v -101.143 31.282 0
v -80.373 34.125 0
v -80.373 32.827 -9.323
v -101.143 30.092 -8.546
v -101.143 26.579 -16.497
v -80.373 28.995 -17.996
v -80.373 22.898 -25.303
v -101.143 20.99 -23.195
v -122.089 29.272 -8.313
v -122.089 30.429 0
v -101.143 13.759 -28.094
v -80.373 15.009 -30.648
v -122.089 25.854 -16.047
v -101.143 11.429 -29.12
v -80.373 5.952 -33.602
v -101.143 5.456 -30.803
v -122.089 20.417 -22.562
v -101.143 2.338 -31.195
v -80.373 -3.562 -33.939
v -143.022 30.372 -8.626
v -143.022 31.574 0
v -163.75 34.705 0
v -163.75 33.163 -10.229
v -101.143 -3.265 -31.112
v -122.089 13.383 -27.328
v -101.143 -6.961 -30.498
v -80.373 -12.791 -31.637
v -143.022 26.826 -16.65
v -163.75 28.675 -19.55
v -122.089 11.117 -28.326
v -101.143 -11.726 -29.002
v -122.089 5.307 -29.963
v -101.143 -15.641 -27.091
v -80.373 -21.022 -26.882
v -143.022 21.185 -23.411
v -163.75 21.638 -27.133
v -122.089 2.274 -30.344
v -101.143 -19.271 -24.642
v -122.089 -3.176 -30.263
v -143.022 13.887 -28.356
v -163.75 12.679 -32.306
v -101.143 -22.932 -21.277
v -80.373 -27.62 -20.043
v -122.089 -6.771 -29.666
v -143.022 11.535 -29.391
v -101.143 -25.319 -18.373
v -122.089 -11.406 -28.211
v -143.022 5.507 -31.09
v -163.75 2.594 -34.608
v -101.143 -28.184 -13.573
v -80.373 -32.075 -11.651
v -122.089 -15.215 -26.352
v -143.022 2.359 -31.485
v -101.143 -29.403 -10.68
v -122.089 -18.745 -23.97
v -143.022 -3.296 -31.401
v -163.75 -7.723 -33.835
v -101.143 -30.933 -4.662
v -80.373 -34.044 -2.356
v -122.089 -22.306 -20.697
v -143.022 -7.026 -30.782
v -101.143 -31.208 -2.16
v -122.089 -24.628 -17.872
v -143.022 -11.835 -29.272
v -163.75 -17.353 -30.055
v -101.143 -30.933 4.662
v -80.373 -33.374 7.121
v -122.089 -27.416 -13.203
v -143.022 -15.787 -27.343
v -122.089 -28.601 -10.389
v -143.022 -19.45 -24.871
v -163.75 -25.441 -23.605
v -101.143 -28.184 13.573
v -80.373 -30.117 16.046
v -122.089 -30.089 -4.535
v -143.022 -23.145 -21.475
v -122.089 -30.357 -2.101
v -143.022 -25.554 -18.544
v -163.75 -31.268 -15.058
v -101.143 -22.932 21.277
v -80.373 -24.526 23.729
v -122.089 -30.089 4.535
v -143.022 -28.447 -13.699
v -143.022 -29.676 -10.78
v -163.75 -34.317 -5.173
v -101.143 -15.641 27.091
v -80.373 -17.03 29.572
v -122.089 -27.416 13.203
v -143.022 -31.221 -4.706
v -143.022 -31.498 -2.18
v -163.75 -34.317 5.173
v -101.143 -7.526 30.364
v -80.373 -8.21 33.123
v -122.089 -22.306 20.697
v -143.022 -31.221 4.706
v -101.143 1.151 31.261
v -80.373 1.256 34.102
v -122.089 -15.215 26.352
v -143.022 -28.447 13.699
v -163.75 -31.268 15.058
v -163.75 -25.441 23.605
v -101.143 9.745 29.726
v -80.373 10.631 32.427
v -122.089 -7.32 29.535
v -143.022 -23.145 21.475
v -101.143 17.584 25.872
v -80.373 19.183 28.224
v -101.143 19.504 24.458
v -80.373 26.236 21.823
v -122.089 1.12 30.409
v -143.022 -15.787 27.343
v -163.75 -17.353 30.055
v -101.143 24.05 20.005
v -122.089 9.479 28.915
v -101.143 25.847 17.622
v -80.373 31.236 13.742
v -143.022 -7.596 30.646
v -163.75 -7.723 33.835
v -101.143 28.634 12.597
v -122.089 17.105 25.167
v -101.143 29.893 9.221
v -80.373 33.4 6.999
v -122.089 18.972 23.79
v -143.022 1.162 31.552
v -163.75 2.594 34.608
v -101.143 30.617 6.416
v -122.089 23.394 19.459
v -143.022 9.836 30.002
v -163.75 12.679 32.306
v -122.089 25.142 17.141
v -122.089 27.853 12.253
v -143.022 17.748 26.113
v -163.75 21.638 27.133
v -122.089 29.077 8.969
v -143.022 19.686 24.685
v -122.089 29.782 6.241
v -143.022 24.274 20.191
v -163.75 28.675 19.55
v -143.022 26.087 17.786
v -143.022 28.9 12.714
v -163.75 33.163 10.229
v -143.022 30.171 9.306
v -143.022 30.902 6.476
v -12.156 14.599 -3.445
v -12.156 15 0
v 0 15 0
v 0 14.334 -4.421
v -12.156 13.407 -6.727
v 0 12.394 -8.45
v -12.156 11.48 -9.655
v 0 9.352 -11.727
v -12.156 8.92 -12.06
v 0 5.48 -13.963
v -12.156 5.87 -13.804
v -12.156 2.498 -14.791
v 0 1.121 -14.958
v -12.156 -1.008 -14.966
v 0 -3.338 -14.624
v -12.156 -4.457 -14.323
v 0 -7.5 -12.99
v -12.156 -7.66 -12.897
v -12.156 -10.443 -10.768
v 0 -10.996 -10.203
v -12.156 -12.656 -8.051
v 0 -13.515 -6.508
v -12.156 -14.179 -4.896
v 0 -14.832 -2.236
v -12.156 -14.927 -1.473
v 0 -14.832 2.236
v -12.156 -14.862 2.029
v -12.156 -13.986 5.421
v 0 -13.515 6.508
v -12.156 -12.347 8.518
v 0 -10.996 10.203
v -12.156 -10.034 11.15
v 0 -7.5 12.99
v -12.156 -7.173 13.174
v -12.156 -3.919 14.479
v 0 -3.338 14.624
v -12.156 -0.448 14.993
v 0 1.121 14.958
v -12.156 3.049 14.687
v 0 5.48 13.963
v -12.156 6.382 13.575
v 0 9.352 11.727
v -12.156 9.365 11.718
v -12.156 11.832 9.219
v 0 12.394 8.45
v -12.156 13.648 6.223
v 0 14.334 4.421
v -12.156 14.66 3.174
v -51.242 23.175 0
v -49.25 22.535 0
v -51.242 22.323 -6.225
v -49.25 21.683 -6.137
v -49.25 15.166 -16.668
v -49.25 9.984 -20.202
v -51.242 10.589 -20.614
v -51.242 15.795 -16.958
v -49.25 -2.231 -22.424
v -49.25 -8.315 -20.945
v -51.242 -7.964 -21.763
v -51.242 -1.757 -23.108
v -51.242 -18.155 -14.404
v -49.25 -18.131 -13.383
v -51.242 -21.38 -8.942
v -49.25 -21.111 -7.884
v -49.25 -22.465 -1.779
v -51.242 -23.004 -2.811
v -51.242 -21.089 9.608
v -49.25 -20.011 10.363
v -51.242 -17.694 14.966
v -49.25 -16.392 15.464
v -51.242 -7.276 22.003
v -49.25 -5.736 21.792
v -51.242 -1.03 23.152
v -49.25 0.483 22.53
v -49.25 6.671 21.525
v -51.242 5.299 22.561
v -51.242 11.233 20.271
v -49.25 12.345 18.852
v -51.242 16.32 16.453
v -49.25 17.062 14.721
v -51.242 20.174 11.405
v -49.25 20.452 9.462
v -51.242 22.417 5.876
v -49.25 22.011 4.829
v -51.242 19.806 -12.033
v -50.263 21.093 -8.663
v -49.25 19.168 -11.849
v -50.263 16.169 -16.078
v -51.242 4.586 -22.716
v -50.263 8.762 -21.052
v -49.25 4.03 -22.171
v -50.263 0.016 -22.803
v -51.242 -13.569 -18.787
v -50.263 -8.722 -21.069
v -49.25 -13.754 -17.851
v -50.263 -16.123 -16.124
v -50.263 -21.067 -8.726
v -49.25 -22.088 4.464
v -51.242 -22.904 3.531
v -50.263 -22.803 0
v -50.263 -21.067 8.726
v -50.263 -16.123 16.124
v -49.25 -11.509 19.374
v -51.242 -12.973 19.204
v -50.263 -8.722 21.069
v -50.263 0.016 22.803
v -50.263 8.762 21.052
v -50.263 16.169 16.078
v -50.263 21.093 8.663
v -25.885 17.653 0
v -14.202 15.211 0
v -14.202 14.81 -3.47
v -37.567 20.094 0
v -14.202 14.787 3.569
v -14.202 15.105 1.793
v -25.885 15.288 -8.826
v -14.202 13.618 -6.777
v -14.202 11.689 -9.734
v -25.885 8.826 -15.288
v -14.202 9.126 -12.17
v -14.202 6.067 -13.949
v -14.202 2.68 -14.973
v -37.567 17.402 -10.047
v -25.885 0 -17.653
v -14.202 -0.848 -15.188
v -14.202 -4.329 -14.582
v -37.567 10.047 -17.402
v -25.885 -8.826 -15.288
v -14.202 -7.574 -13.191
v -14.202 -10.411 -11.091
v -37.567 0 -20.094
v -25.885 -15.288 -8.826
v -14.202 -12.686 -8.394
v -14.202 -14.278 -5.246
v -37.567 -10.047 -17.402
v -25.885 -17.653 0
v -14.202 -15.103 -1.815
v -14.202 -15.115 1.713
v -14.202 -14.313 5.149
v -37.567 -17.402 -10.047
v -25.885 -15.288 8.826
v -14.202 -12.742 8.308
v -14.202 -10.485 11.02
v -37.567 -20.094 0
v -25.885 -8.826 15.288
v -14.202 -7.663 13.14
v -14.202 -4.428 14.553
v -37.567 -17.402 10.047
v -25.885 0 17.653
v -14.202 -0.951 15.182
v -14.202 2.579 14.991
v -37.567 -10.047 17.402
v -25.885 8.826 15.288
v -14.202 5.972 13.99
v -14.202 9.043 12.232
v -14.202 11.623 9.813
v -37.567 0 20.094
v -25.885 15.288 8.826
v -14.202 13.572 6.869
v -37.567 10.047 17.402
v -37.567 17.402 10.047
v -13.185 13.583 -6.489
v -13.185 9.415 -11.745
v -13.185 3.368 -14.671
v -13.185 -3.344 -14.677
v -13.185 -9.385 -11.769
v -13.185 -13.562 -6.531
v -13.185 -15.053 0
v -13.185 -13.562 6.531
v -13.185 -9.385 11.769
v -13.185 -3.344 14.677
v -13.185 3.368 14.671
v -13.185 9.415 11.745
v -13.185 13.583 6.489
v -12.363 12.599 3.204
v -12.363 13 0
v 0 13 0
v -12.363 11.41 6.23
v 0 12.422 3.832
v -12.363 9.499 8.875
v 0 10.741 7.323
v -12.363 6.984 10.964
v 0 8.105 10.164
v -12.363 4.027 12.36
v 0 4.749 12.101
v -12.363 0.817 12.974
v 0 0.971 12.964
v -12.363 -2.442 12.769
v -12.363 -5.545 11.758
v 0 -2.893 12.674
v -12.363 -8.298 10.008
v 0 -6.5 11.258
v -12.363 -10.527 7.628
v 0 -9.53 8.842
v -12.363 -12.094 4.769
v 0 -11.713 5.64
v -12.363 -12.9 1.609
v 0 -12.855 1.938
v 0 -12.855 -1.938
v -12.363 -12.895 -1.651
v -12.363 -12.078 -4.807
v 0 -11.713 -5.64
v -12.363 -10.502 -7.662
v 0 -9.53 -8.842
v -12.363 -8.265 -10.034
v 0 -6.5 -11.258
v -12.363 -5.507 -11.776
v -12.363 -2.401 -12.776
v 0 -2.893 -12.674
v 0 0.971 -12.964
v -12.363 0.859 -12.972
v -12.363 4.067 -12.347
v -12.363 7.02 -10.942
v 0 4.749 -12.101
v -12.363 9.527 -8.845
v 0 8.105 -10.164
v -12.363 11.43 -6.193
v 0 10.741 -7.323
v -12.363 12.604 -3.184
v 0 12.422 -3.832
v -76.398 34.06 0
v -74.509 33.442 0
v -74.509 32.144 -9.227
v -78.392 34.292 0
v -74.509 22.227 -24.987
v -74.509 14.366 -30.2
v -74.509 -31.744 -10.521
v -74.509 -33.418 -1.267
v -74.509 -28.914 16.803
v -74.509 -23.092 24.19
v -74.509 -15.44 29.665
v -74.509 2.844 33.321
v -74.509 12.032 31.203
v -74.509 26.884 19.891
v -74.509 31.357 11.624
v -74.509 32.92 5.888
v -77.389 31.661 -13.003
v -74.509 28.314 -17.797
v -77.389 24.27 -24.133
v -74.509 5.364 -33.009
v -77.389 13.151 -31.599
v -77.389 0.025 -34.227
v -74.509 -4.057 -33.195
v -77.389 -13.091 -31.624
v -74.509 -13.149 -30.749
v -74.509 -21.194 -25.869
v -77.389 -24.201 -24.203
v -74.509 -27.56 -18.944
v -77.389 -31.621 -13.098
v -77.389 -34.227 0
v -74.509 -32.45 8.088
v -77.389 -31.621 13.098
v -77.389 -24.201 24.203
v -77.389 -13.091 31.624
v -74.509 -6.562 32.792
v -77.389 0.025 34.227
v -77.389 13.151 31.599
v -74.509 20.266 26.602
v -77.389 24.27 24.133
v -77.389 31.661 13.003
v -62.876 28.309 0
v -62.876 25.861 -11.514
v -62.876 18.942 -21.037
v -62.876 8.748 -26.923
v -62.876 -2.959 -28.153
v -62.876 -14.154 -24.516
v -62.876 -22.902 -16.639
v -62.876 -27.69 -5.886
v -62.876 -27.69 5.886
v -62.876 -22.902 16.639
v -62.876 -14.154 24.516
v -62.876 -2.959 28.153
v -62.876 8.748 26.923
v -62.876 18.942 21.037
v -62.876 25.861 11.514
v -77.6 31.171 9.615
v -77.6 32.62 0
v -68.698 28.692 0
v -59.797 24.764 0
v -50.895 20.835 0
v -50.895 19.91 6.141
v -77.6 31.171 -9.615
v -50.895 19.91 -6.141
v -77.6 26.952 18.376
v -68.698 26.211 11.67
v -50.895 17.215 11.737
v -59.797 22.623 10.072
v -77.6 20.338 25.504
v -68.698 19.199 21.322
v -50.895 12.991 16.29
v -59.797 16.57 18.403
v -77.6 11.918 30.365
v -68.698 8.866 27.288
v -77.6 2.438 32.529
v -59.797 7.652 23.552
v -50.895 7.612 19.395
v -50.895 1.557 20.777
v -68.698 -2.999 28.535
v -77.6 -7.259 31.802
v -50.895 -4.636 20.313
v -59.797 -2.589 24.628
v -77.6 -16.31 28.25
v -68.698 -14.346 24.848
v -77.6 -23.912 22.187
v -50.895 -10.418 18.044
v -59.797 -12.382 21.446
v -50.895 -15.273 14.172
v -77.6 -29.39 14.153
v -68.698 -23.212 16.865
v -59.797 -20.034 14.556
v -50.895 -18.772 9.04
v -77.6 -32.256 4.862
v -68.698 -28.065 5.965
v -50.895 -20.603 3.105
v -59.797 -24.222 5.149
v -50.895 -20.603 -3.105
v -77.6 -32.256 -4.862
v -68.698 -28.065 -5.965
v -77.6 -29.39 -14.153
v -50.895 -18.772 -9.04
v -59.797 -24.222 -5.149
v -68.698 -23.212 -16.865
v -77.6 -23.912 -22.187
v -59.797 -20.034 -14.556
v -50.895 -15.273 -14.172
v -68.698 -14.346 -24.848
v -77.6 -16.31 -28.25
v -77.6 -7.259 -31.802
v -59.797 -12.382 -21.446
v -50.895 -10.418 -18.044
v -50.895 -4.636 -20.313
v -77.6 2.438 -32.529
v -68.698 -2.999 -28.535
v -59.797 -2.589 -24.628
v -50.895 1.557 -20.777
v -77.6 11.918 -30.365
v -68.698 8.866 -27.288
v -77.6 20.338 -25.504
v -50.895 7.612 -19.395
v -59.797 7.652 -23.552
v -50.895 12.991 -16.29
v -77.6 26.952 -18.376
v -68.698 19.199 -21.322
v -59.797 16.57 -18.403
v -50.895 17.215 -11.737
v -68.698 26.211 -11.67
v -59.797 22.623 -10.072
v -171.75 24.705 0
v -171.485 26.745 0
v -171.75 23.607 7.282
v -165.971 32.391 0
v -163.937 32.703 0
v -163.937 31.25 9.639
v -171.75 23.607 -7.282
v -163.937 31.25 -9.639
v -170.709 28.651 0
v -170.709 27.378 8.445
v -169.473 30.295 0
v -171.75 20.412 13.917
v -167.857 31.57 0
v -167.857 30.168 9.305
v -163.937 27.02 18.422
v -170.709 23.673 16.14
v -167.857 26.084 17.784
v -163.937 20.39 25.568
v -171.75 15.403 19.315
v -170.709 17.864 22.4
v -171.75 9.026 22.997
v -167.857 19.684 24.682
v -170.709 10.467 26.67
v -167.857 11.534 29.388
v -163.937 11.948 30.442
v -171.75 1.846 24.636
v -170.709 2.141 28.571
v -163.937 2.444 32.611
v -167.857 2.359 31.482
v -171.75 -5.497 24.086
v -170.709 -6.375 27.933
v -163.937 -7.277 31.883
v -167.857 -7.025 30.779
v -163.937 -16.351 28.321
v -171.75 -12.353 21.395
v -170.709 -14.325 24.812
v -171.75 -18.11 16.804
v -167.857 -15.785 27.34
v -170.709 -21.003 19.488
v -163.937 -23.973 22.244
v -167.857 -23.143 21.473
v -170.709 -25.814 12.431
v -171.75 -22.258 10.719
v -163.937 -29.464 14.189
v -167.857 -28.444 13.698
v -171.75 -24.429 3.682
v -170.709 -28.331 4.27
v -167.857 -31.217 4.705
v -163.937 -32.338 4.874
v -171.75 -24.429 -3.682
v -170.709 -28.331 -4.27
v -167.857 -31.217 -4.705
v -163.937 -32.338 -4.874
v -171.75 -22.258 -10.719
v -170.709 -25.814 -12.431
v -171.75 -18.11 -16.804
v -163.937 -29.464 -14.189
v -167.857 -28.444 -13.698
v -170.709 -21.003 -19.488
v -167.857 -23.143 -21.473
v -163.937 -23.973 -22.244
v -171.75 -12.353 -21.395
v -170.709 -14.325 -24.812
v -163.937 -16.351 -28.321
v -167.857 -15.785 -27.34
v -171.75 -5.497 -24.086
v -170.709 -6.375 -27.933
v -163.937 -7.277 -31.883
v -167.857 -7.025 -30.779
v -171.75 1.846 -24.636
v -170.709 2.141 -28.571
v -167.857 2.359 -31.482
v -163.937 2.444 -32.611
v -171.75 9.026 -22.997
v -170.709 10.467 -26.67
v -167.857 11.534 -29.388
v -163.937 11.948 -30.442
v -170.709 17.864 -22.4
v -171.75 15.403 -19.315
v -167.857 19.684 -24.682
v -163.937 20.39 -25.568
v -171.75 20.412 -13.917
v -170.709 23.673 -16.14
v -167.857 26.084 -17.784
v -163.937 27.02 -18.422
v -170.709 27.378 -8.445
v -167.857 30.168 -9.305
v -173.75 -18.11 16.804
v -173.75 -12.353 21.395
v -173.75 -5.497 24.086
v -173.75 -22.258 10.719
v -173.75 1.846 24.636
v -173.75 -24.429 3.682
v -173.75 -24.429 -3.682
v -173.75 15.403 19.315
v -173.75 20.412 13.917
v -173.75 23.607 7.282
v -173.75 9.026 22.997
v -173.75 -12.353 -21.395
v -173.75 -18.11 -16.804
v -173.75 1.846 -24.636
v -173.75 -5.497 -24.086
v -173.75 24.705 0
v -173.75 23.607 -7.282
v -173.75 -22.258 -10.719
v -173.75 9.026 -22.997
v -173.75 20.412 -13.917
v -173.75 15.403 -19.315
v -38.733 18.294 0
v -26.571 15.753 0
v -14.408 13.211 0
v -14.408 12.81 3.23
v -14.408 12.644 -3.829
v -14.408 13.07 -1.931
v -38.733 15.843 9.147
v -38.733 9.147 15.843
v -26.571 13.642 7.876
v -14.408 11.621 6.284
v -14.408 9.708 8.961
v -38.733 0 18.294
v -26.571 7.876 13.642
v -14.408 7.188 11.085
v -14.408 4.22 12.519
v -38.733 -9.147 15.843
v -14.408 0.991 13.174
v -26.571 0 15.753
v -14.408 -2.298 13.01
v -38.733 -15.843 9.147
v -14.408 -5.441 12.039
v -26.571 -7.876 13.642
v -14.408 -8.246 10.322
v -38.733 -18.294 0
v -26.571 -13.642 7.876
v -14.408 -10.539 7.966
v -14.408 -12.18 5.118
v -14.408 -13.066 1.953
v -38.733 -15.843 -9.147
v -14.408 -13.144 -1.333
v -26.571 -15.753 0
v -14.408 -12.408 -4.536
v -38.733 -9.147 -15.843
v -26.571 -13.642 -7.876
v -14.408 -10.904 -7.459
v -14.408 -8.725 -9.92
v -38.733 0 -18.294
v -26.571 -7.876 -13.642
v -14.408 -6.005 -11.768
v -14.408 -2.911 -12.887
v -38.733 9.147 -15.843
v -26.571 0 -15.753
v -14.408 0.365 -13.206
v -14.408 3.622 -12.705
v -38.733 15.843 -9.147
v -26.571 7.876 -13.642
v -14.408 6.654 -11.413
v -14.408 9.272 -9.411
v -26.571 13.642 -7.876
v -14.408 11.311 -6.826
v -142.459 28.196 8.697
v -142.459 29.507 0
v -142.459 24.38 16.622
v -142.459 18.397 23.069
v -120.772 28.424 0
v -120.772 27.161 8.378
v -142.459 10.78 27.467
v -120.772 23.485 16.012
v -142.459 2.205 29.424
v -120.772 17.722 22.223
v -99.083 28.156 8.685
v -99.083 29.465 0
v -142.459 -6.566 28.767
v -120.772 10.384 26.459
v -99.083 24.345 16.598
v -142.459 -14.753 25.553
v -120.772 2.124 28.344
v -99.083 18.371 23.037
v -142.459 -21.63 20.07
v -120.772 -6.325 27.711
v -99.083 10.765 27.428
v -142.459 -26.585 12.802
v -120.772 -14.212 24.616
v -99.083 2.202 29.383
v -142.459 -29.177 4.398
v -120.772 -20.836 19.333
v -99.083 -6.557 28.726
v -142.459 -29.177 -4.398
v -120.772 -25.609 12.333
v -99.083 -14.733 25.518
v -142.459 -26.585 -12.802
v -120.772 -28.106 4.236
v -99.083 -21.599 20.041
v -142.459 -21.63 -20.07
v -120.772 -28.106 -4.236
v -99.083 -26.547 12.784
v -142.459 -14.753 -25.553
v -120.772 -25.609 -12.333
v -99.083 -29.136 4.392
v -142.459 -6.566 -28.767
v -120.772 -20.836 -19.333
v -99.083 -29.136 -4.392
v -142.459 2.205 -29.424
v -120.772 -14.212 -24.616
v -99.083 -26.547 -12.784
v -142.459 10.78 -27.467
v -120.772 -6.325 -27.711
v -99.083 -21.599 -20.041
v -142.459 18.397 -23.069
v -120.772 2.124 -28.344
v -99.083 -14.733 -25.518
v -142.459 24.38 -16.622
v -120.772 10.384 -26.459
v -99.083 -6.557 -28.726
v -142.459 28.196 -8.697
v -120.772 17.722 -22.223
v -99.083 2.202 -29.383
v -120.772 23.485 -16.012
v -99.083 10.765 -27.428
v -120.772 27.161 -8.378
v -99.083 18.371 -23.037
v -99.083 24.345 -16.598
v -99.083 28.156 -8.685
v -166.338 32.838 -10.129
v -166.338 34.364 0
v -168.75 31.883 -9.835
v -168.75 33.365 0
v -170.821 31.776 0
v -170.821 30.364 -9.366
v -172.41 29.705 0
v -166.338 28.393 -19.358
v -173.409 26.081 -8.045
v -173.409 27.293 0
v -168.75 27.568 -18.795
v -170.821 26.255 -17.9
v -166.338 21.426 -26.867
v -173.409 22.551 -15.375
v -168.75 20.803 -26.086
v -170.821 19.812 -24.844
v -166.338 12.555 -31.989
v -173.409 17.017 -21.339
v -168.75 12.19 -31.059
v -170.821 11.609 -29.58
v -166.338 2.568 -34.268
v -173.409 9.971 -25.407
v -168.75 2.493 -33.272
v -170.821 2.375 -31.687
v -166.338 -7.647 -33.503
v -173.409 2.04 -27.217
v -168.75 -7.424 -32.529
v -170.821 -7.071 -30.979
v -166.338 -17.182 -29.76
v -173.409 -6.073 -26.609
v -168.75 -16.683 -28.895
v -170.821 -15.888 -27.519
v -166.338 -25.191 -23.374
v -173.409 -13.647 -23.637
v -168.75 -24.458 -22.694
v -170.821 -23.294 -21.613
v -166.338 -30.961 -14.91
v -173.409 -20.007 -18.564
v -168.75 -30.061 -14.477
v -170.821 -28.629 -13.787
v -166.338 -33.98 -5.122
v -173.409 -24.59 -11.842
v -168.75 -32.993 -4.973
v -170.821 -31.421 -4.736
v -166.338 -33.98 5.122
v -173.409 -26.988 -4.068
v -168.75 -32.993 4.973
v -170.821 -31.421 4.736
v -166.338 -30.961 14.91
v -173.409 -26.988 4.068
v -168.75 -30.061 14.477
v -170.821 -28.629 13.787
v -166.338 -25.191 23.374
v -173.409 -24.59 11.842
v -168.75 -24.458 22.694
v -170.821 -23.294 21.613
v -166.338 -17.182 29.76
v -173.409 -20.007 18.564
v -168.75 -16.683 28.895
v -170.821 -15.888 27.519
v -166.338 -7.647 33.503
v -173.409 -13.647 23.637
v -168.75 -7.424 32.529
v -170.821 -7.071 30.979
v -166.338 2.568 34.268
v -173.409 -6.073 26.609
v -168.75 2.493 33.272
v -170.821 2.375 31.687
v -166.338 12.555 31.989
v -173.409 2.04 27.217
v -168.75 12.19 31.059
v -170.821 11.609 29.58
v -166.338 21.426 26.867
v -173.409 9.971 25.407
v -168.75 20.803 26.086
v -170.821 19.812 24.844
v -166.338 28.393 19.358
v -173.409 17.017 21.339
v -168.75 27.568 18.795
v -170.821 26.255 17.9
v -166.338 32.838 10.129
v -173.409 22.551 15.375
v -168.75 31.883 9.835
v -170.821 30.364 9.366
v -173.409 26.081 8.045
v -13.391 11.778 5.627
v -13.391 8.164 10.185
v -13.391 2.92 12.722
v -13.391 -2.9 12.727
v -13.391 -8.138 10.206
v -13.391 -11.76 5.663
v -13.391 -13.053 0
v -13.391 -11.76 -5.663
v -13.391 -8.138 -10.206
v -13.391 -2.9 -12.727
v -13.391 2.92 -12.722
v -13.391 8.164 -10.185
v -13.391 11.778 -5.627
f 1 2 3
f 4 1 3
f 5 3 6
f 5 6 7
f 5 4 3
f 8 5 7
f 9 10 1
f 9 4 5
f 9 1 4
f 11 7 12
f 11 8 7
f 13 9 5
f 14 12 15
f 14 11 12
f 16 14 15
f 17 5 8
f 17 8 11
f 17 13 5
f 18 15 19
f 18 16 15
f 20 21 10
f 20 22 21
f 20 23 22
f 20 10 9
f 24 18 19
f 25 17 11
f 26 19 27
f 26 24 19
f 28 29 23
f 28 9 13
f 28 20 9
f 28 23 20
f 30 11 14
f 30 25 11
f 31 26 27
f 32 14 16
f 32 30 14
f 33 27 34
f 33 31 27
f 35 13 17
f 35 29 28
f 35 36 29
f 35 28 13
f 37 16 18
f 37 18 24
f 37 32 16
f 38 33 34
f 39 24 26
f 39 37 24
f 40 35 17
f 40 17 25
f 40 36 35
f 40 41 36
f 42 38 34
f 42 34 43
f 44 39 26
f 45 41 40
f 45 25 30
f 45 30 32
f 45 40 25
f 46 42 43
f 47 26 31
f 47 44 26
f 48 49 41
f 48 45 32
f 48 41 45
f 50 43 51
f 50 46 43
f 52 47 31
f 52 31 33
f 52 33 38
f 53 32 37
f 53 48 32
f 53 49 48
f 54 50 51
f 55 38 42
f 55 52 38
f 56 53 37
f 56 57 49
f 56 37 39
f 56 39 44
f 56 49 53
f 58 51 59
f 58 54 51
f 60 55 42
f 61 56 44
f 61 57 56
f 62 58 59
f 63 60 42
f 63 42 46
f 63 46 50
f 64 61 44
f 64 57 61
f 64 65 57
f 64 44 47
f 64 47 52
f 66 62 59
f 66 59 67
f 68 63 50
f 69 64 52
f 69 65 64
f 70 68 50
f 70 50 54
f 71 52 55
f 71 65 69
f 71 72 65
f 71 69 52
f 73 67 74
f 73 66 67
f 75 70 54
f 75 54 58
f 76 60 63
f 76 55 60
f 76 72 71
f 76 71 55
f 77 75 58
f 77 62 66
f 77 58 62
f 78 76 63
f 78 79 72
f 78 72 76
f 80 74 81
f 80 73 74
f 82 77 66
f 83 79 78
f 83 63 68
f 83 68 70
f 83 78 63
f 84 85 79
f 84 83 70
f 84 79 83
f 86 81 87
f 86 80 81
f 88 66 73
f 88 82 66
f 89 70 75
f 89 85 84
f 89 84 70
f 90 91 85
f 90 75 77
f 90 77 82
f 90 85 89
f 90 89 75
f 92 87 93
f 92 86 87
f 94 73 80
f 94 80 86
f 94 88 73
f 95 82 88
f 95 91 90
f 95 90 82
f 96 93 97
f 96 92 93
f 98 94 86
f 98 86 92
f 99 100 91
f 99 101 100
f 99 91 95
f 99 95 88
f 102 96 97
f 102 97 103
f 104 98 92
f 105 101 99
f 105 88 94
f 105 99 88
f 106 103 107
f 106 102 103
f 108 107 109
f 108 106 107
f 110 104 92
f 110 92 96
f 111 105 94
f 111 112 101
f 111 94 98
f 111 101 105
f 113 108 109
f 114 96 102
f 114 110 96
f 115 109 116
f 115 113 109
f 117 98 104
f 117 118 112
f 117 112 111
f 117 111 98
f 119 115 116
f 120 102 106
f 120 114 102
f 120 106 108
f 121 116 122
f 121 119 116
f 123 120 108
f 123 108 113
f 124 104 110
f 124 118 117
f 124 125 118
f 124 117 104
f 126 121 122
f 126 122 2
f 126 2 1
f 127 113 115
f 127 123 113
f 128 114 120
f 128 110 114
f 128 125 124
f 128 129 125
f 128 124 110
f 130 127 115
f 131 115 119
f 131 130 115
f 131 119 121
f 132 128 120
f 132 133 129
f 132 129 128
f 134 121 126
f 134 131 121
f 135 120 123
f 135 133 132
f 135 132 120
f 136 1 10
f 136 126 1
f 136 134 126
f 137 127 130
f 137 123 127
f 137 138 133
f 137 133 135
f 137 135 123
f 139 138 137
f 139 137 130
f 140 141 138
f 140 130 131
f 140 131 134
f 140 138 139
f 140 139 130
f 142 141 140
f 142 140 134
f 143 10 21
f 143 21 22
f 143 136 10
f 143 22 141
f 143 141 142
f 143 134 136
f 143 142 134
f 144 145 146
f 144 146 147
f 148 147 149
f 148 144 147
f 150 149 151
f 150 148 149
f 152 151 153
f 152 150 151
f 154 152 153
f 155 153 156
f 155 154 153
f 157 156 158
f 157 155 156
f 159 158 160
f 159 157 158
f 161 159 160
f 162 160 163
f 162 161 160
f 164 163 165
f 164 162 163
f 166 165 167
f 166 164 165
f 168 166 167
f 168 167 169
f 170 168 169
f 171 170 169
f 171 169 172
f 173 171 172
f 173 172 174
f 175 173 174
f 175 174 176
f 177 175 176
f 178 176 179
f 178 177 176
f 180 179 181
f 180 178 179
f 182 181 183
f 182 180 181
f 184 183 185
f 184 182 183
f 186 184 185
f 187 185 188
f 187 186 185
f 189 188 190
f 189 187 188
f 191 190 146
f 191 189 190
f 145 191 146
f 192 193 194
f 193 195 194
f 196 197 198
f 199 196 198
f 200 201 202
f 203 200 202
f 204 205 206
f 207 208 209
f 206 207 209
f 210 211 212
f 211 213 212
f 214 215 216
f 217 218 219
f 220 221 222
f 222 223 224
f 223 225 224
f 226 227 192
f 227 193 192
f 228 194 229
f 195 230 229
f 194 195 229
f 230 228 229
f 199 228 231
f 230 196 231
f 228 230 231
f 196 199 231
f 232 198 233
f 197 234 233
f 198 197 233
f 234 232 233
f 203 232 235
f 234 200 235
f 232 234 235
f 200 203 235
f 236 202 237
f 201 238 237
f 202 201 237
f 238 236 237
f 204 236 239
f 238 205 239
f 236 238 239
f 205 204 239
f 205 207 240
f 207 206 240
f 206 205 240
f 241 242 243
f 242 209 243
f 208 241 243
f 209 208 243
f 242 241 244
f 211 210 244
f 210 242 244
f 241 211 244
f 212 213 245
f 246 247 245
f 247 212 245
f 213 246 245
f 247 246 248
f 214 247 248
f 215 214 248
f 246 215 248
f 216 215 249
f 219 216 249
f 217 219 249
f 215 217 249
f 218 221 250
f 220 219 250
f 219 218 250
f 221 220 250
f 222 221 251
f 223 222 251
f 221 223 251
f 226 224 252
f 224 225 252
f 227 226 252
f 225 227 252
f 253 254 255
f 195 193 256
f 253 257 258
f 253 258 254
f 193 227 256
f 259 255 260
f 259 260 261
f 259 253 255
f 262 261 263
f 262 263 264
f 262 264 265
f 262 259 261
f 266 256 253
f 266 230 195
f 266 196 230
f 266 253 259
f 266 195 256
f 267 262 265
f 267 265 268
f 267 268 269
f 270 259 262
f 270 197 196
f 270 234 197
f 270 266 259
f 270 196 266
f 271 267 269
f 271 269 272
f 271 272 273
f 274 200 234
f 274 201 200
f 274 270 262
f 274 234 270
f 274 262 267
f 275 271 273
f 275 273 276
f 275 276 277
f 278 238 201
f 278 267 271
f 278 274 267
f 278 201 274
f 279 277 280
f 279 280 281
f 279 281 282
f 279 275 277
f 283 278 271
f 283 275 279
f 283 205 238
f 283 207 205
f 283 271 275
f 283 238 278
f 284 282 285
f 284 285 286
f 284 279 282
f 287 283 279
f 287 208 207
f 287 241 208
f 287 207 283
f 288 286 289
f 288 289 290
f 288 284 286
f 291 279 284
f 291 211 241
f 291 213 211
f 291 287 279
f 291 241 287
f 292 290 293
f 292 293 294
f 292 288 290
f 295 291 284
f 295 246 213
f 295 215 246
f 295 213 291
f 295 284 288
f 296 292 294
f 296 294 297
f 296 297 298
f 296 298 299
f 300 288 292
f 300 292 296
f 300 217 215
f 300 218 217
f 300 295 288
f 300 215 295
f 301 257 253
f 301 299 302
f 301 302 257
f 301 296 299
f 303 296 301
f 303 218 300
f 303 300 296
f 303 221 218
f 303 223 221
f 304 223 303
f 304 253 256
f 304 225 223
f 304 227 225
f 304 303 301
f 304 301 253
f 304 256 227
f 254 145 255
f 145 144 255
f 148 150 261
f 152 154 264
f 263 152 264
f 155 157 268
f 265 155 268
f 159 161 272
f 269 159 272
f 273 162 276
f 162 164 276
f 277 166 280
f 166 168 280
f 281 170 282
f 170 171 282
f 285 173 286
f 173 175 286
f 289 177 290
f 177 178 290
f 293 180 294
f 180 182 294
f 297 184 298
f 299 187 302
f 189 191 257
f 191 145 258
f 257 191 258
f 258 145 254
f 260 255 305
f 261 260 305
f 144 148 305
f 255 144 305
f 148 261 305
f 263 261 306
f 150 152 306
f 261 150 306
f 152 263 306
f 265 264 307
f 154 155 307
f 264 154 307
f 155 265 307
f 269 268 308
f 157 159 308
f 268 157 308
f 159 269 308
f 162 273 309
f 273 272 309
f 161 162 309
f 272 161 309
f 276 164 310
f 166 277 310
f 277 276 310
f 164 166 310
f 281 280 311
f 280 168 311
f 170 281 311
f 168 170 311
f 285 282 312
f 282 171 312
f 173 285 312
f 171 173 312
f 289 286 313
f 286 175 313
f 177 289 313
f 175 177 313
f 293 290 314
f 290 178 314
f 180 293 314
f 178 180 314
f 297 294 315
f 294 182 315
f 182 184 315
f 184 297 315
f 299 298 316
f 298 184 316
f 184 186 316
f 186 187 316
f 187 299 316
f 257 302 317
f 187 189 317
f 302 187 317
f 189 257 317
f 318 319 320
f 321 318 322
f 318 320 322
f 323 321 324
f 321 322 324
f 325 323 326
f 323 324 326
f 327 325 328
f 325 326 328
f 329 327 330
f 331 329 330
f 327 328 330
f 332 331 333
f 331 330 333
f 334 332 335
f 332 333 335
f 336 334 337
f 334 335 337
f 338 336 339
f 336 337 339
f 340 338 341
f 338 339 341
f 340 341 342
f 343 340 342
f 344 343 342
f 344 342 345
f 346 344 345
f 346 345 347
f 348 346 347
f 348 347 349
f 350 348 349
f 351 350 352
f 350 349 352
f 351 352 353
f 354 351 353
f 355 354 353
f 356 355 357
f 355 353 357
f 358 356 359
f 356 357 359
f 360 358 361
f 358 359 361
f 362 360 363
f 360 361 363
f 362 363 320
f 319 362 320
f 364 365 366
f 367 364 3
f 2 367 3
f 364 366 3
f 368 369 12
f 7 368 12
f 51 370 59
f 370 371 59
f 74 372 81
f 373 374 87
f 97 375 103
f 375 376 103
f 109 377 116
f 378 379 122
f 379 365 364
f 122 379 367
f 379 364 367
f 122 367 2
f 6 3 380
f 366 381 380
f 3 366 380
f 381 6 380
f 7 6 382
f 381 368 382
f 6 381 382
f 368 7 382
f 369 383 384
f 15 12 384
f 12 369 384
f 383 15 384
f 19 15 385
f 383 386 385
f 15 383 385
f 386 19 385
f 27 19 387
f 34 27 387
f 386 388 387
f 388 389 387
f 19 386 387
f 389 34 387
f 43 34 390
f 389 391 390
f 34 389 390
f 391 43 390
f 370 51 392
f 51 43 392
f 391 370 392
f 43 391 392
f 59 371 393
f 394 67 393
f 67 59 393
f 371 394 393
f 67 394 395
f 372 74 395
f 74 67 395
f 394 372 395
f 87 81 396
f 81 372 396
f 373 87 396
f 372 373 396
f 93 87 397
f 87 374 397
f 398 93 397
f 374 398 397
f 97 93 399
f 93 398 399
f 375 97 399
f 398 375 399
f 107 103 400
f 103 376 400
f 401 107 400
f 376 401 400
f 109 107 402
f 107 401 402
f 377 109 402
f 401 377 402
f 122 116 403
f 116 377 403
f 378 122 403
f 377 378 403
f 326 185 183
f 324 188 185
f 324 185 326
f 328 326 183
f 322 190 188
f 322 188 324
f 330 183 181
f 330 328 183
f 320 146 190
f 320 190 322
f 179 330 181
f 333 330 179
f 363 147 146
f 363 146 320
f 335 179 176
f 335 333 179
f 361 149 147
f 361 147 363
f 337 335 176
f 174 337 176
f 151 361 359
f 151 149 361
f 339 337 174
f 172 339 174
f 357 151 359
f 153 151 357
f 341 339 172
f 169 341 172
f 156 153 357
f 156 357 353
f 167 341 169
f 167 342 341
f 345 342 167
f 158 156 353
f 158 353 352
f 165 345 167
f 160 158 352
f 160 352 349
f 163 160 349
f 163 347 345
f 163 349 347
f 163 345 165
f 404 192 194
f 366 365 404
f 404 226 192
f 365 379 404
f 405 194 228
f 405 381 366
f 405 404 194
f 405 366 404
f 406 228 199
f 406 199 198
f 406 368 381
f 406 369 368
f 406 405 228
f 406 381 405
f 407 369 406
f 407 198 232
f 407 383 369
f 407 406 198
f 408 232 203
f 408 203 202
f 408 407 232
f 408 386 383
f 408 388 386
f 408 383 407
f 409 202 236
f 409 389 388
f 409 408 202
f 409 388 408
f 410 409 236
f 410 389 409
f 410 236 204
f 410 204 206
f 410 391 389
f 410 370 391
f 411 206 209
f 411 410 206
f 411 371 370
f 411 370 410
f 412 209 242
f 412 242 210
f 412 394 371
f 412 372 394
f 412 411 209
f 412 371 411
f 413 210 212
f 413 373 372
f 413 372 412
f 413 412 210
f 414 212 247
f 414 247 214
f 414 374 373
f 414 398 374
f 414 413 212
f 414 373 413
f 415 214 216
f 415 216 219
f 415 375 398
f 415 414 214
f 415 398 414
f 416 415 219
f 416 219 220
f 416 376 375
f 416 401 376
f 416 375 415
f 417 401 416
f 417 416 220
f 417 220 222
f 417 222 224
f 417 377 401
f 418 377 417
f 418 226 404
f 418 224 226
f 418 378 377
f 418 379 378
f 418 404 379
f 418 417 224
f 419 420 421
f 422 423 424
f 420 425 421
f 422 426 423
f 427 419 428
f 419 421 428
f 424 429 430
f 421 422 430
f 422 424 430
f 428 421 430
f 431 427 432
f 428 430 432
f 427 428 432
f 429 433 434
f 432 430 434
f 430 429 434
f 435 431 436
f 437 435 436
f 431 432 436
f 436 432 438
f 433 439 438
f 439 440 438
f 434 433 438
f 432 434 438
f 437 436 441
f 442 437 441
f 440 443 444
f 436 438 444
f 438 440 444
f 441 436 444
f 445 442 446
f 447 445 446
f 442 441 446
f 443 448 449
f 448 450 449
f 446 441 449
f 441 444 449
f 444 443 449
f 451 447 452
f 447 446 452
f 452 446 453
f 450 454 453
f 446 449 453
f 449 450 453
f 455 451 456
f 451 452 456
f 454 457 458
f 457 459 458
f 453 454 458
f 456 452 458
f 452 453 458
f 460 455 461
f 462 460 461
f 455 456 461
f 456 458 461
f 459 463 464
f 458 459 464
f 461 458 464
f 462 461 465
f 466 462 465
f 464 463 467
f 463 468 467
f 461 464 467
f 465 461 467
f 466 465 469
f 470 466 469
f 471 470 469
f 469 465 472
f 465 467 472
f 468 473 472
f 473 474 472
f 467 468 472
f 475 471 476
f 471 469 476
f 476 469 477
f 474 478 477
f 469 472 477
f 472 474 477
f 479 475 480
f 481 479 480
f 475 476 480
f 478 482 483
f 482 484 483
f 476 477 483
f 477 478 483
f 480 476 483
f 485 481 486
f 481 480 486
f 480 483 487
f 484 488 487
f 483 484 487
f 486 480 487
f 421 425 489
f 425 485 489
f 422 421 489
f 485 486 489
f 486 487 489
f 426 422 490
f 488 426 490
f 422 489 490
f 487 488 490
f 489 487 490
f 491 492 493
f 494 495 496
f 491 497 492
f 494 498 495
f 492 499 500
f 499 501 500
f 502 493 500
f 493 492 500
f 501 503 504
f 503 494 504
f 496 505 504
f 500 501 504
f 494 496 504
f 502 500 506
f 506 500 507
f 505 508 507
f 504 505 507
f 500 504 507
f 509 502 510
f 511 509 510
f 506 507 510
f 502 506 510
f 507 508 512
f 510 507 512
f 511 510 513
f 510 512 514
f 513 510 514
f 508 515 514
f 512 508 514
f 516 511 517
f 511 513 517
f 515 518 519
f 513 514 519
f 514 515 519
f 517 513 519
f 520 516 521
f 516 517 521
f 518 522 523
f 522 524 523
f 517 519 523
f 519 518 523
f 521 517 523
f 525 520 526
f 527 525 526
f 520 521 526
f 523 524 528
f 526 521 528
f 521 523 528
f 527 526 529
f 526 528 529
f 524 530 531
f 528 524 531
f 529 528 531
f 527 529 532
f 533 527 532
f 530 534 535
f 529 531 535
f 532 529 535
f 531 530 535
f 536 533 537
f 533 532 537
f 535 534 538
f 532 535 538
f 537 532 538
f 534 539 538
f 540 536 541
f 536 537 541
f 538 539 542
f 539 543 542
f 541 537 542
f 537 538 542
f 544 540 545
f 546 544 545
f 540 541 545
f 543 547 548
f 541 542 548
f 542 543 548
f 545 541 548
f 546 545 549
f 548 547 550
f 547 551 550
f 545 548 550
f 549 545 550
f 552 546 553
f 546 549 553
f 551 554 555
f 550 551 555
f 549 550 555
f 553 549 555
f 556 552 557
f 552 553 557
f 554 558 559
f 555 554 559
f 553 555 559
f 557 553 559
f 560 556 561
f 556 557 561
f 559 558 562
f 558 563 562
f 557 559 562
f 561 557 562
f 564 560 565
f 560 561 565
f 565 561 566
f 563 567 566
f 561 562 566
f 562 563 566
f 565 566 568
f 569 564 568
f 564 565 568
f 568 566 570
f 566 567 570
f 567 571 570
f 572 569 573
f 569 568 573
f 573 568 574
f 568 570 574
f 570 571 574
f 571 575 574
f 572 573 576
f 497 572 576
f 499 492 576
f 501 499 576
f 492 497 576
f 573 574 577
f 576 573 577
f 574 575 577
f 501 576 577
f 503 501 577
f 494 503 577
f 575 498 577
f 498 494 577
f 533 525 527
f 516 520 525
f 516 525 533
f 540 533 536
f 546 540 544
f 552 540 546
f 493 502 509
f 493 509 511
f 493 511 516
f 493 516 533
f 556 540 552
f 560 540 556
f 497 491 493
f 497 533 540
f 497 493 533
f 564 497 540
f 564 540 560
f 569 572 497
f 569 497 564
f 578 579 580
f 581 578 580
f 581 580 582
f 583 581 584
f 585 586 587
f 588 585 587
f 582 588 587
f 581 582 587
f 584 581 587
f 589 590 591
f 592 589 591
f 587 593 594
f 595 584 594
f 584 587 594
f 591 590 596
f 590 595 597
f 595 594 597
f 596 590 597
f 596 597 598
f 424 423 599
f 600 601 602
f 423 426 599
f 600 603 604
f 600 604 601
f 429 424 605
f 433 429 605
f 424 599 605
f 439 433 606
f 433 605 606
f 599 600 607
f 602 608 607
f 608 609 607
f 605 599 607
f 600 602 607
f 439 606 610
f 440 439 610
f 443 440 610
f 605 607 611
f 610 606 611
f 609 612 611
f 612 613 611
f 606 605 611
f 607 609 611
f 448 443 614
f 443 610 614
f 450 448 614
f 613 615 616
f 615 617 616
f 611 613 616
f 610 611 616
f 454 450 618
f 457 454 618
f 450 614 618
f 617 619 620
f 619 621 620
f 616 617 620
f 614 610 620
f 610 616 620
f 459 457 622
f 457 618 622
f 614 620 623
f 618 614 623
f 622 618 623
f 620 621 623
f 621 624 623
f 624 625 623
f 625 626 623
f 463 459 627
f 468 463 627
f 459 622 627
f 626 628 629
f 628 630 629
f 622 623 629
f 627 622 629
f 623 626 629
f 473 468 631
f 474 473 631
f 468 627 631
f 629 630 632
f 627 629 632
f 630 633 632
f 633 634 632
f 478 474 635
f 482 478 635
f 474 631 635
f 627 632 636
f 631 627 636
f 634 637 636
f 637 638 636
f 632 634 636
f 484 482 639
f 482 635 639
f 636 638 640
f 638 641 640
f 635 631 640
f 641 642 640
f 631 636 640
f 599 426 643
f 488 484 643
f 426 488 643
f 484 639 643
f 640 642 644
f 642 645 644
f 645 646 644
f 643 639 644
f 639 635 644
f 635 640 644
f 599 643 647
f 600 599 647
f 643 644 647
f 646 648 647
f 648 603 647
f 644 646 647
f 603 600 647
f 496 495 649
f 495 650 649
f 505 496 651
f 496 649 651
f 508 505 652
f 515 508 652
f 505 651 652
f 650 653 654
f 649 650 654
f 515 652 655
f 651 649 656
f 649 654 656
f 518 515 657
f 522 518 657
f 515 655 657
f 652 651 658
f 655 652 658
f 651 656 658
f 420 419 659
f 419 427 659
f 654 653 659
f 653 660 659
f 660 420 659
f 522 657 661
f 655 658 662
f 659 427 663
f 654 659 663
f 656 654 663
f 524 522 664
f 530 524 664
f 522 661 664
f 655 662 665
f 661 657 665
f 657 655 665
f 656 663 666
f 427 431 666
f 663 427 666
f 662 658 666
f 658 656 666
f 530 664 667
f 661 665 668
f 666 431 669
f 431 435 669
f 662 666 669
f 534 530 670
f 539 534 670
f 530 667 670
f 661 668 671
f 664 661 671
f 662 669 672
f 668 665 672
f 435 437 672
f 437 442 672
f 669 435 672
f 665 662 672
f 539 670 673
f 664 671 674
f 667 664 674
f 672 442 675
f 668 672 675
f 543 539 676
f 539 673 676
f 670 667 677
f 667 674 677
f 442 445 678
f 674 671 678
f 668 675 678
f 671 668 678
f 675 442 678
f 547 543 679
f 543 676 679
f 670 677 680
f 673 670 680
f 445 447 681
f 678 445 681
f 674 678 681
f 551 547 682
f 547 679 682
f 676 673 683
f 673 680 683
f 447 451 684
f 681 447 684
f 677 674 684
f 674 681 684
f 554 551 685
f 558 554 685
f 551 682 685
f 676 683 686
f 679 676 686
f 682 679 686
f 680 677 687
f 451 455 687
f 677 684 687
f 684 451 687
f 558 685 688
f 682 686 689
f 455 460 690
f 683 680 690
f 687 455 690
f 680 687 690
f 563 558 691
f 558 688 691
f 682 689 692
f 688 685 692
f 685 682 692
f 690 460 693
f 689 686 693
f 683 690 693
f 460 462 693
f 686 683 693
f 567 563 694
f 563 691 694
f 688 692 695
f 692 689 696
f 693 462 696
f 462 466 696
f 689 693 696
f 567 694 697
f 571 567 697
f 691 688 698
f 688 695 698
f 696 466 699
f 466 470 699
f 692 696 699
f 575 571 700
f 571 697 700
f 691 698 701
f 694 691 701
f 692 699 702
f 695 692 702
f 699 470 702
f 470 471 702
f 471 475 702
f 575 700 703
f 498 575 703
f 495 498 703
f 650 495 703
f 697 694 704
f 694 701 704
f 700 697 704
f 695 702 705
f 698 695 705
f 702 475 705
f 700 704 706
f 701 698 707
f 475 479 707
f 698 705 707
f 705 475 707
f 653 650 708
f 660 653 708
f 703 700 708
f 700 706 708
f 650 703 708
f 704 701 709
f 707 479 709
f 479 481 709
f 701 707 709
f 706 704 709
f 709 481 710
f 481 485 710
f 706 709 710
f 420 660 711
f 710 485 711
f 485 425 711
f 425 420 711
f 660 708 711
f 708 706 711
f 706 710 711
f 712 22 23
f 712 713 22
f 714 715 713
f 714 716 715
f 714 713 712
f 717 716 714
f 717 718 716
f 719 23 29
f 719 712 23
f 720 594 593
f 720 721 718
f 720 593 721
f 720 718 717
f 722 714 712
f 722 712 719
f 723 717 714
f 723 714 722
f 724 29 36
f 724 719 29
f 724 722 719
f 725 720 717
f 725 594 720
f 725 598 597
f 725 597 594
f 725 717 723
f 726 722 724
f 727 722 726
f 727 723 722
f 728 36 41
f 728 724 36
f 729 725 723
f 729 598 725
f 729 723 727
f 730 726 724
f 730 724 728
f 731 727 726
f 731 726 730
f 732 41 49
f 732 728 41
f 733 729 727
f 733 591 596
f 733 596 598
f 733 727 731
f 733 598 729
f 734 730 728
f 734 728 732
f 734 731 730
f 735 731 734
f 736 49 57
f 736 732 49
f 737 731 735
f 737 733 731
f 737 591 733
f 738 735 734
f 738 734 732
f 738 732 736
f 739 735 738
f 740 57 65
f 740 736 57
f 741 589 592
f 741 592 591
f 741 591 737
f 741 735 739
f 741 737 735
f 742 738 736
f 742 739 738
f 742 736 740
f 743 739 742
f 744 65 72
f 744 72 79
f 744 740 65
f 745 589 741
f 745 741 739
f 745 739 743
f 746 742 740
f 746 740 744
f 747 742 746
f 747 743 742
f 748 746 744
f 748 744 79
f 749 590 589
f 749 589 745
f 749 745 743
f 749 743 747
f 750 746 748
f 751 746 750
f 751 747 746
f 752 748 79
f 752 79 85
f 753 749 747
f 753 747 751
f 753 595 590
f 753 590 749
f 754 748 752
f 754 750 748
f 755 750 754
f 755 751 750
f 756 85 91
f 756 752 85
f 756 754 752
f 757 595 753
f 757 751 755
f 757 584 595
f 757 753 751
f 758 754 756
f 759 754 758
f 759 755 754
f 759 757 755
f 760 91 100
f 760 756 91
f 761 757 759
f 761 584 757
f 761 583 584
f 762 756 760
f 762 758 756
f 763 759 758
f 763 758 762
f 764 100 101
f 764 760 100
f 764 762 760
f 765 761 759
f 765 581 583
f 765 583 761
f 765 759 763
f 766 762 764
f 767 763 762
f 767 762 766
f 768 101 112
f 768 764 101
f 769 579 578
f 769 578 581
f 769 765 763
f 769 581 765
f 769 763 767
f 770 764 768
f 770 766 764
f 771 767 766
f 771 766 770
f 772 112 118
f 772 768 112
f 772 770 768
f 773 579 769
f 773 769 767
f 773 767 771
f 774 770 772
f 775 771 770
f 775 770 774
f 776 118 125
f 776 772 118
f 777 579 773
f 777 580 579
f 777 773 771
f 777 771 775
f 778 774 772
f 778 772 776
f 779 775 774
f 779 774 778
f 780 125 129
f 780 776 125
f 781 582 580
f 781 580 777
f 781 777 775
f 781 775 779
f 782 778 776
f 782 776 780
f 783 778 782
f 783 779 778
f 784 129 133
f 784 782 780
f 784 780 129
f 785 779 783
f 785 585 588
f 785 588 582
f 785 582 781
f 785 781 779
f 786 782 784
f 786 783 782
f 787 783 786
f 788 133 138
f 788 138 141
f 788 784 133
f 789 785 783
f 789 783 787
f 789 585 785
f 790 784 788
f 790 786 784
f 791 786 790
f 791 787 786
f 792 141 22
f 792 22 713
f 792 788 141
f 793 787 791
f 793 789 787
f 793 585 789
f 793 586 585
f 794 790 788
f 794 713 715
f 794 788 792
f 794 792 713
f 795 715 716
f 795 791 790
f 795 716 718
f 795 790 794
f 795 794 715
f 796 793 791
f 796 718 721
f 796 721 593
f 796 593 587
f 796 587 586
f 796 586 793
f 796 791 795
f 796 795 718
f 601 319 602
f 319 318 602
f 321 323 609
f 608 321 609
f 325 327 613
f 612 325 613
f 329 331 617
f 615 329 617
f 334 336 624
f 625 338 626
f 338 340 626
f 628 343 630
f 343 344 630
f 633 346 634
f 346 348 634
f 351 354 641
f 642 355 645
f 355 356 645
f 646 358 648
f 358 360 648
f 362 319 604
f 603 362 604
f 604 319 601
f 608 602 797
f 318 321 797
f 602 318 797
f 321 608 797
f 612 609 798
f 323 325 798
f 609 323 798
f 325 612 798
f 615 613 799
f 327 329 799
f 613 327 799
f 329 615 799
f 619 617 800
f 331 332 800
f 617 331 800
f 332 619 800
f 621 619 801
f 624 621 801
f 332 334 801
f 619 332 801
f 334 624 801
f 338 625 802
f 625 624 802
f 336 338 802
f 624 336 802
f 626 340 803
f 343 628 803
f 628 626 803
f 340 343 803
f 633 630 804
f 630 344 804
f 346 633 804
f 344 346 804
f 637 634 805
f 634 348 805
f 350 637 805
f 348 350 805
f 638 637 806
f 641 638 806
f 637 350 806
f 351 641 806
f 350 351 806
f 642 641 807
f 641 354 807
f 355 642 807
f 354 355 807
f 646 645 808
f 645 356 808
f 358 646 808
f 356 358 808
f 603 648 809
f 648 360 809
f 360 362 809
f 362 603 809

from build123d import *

# Parameters (mm, degrees)
BOSS_EXTRUDE1_START = 2
SKETCH2_R           = 24.705
BOSS_EXTRUDE1_DEPTH = 2
FILLET1_R           = 10
FILLET2_R           = 10


# Read off the part's stored shape, not the designer's step: Shell2
with BuildPart() as part:
    # Sketch1 → Revolve1 (revolve)
    with BuildSketch(Plane.XY):
        with BuildLine():
            Line((-173.75, 0), (0, 0))
            Line((0, 0), (0, 15))
            Line((0, 15), (-13.19, 15))
            Line((-13.19, 15), (-50.28, 22.75))
            Line((-50.28, 22.75), (-77.37, 34.705))
            ThreePointArc((-77.37, 34.705), (-120.56, 30.423853835), (-163.75, 34.705))
            ThreePointArc((-163.75, 34.705), (-170.821067812, 31.776067812), (-173.75, 24.705))
            Line((-173.75, 24.705), (-173.75, 0))
        make_face()
    revolve(axis=Axis((0, 0, 0), (-1, 0, 0)))

    # Shell2 outline → Shell2 (revolve, cut)
    with BuildSketch(Plane.YX):
        with BuildLine():
            Line((24.705, -173.75), (24.705, -171.75))
            ThreePointArc((24.705, -171.75), (30.295405132, -169.472531822), (32.702817817, -163.936842615))
            ThreePointArc((32.702817817, -163.936842615), (28.423955347, -120.772299747), (32.620253078, -77.599652035))
            Line((32.620253078, -77.599652035), (20.835311789, -50.895004646))
            Line((20.835311789, -50.895004646), (13, -13.396718937))
            Line((13, -13.396718937), (13, 0))
            Line((13, 0), (0, 0))
            Line((0, 0), (0, -173.75))
            Line((0, -173.75), (24.705, -173.75))
        make_face()
    revolve(axis=Axis((0, 0, 0), (1, 0, 0)), mode=Mode.SUBTRACT)

    # Sketch2 → Boss-Extrude1 (add)
    with BuildSketch(Plane(origin=(-173.75, 0, 0), x_dir=(0, 0, -1), z_dir=(1, 0, 0)).offset(BOSS_EXTRUDE1_START)):
        Circle(SKETCH2_R)
    extrude(amount=-BOSS_EXTRUDE1_DEPTH)

    # Fillet1
    fillet1_edges = [part.edges().sort_by_distance(p)[0] for p in [
        (-77.37, -34.705, 0),
        (-50.28, -22.75, 0),
        (-13.19, -15, 0),
    ]]
    fillet(fillet1_edges, radius=FILLET1_R)

    # Fillet2
    fillet2_edges = [part.edges().sort_by_distance(p)[0] for p in [
        (-13.396718937, -13, 0),
    ]]
    fillet(fillet2_edges, radius=FILLET2_R)


solid = part.part
